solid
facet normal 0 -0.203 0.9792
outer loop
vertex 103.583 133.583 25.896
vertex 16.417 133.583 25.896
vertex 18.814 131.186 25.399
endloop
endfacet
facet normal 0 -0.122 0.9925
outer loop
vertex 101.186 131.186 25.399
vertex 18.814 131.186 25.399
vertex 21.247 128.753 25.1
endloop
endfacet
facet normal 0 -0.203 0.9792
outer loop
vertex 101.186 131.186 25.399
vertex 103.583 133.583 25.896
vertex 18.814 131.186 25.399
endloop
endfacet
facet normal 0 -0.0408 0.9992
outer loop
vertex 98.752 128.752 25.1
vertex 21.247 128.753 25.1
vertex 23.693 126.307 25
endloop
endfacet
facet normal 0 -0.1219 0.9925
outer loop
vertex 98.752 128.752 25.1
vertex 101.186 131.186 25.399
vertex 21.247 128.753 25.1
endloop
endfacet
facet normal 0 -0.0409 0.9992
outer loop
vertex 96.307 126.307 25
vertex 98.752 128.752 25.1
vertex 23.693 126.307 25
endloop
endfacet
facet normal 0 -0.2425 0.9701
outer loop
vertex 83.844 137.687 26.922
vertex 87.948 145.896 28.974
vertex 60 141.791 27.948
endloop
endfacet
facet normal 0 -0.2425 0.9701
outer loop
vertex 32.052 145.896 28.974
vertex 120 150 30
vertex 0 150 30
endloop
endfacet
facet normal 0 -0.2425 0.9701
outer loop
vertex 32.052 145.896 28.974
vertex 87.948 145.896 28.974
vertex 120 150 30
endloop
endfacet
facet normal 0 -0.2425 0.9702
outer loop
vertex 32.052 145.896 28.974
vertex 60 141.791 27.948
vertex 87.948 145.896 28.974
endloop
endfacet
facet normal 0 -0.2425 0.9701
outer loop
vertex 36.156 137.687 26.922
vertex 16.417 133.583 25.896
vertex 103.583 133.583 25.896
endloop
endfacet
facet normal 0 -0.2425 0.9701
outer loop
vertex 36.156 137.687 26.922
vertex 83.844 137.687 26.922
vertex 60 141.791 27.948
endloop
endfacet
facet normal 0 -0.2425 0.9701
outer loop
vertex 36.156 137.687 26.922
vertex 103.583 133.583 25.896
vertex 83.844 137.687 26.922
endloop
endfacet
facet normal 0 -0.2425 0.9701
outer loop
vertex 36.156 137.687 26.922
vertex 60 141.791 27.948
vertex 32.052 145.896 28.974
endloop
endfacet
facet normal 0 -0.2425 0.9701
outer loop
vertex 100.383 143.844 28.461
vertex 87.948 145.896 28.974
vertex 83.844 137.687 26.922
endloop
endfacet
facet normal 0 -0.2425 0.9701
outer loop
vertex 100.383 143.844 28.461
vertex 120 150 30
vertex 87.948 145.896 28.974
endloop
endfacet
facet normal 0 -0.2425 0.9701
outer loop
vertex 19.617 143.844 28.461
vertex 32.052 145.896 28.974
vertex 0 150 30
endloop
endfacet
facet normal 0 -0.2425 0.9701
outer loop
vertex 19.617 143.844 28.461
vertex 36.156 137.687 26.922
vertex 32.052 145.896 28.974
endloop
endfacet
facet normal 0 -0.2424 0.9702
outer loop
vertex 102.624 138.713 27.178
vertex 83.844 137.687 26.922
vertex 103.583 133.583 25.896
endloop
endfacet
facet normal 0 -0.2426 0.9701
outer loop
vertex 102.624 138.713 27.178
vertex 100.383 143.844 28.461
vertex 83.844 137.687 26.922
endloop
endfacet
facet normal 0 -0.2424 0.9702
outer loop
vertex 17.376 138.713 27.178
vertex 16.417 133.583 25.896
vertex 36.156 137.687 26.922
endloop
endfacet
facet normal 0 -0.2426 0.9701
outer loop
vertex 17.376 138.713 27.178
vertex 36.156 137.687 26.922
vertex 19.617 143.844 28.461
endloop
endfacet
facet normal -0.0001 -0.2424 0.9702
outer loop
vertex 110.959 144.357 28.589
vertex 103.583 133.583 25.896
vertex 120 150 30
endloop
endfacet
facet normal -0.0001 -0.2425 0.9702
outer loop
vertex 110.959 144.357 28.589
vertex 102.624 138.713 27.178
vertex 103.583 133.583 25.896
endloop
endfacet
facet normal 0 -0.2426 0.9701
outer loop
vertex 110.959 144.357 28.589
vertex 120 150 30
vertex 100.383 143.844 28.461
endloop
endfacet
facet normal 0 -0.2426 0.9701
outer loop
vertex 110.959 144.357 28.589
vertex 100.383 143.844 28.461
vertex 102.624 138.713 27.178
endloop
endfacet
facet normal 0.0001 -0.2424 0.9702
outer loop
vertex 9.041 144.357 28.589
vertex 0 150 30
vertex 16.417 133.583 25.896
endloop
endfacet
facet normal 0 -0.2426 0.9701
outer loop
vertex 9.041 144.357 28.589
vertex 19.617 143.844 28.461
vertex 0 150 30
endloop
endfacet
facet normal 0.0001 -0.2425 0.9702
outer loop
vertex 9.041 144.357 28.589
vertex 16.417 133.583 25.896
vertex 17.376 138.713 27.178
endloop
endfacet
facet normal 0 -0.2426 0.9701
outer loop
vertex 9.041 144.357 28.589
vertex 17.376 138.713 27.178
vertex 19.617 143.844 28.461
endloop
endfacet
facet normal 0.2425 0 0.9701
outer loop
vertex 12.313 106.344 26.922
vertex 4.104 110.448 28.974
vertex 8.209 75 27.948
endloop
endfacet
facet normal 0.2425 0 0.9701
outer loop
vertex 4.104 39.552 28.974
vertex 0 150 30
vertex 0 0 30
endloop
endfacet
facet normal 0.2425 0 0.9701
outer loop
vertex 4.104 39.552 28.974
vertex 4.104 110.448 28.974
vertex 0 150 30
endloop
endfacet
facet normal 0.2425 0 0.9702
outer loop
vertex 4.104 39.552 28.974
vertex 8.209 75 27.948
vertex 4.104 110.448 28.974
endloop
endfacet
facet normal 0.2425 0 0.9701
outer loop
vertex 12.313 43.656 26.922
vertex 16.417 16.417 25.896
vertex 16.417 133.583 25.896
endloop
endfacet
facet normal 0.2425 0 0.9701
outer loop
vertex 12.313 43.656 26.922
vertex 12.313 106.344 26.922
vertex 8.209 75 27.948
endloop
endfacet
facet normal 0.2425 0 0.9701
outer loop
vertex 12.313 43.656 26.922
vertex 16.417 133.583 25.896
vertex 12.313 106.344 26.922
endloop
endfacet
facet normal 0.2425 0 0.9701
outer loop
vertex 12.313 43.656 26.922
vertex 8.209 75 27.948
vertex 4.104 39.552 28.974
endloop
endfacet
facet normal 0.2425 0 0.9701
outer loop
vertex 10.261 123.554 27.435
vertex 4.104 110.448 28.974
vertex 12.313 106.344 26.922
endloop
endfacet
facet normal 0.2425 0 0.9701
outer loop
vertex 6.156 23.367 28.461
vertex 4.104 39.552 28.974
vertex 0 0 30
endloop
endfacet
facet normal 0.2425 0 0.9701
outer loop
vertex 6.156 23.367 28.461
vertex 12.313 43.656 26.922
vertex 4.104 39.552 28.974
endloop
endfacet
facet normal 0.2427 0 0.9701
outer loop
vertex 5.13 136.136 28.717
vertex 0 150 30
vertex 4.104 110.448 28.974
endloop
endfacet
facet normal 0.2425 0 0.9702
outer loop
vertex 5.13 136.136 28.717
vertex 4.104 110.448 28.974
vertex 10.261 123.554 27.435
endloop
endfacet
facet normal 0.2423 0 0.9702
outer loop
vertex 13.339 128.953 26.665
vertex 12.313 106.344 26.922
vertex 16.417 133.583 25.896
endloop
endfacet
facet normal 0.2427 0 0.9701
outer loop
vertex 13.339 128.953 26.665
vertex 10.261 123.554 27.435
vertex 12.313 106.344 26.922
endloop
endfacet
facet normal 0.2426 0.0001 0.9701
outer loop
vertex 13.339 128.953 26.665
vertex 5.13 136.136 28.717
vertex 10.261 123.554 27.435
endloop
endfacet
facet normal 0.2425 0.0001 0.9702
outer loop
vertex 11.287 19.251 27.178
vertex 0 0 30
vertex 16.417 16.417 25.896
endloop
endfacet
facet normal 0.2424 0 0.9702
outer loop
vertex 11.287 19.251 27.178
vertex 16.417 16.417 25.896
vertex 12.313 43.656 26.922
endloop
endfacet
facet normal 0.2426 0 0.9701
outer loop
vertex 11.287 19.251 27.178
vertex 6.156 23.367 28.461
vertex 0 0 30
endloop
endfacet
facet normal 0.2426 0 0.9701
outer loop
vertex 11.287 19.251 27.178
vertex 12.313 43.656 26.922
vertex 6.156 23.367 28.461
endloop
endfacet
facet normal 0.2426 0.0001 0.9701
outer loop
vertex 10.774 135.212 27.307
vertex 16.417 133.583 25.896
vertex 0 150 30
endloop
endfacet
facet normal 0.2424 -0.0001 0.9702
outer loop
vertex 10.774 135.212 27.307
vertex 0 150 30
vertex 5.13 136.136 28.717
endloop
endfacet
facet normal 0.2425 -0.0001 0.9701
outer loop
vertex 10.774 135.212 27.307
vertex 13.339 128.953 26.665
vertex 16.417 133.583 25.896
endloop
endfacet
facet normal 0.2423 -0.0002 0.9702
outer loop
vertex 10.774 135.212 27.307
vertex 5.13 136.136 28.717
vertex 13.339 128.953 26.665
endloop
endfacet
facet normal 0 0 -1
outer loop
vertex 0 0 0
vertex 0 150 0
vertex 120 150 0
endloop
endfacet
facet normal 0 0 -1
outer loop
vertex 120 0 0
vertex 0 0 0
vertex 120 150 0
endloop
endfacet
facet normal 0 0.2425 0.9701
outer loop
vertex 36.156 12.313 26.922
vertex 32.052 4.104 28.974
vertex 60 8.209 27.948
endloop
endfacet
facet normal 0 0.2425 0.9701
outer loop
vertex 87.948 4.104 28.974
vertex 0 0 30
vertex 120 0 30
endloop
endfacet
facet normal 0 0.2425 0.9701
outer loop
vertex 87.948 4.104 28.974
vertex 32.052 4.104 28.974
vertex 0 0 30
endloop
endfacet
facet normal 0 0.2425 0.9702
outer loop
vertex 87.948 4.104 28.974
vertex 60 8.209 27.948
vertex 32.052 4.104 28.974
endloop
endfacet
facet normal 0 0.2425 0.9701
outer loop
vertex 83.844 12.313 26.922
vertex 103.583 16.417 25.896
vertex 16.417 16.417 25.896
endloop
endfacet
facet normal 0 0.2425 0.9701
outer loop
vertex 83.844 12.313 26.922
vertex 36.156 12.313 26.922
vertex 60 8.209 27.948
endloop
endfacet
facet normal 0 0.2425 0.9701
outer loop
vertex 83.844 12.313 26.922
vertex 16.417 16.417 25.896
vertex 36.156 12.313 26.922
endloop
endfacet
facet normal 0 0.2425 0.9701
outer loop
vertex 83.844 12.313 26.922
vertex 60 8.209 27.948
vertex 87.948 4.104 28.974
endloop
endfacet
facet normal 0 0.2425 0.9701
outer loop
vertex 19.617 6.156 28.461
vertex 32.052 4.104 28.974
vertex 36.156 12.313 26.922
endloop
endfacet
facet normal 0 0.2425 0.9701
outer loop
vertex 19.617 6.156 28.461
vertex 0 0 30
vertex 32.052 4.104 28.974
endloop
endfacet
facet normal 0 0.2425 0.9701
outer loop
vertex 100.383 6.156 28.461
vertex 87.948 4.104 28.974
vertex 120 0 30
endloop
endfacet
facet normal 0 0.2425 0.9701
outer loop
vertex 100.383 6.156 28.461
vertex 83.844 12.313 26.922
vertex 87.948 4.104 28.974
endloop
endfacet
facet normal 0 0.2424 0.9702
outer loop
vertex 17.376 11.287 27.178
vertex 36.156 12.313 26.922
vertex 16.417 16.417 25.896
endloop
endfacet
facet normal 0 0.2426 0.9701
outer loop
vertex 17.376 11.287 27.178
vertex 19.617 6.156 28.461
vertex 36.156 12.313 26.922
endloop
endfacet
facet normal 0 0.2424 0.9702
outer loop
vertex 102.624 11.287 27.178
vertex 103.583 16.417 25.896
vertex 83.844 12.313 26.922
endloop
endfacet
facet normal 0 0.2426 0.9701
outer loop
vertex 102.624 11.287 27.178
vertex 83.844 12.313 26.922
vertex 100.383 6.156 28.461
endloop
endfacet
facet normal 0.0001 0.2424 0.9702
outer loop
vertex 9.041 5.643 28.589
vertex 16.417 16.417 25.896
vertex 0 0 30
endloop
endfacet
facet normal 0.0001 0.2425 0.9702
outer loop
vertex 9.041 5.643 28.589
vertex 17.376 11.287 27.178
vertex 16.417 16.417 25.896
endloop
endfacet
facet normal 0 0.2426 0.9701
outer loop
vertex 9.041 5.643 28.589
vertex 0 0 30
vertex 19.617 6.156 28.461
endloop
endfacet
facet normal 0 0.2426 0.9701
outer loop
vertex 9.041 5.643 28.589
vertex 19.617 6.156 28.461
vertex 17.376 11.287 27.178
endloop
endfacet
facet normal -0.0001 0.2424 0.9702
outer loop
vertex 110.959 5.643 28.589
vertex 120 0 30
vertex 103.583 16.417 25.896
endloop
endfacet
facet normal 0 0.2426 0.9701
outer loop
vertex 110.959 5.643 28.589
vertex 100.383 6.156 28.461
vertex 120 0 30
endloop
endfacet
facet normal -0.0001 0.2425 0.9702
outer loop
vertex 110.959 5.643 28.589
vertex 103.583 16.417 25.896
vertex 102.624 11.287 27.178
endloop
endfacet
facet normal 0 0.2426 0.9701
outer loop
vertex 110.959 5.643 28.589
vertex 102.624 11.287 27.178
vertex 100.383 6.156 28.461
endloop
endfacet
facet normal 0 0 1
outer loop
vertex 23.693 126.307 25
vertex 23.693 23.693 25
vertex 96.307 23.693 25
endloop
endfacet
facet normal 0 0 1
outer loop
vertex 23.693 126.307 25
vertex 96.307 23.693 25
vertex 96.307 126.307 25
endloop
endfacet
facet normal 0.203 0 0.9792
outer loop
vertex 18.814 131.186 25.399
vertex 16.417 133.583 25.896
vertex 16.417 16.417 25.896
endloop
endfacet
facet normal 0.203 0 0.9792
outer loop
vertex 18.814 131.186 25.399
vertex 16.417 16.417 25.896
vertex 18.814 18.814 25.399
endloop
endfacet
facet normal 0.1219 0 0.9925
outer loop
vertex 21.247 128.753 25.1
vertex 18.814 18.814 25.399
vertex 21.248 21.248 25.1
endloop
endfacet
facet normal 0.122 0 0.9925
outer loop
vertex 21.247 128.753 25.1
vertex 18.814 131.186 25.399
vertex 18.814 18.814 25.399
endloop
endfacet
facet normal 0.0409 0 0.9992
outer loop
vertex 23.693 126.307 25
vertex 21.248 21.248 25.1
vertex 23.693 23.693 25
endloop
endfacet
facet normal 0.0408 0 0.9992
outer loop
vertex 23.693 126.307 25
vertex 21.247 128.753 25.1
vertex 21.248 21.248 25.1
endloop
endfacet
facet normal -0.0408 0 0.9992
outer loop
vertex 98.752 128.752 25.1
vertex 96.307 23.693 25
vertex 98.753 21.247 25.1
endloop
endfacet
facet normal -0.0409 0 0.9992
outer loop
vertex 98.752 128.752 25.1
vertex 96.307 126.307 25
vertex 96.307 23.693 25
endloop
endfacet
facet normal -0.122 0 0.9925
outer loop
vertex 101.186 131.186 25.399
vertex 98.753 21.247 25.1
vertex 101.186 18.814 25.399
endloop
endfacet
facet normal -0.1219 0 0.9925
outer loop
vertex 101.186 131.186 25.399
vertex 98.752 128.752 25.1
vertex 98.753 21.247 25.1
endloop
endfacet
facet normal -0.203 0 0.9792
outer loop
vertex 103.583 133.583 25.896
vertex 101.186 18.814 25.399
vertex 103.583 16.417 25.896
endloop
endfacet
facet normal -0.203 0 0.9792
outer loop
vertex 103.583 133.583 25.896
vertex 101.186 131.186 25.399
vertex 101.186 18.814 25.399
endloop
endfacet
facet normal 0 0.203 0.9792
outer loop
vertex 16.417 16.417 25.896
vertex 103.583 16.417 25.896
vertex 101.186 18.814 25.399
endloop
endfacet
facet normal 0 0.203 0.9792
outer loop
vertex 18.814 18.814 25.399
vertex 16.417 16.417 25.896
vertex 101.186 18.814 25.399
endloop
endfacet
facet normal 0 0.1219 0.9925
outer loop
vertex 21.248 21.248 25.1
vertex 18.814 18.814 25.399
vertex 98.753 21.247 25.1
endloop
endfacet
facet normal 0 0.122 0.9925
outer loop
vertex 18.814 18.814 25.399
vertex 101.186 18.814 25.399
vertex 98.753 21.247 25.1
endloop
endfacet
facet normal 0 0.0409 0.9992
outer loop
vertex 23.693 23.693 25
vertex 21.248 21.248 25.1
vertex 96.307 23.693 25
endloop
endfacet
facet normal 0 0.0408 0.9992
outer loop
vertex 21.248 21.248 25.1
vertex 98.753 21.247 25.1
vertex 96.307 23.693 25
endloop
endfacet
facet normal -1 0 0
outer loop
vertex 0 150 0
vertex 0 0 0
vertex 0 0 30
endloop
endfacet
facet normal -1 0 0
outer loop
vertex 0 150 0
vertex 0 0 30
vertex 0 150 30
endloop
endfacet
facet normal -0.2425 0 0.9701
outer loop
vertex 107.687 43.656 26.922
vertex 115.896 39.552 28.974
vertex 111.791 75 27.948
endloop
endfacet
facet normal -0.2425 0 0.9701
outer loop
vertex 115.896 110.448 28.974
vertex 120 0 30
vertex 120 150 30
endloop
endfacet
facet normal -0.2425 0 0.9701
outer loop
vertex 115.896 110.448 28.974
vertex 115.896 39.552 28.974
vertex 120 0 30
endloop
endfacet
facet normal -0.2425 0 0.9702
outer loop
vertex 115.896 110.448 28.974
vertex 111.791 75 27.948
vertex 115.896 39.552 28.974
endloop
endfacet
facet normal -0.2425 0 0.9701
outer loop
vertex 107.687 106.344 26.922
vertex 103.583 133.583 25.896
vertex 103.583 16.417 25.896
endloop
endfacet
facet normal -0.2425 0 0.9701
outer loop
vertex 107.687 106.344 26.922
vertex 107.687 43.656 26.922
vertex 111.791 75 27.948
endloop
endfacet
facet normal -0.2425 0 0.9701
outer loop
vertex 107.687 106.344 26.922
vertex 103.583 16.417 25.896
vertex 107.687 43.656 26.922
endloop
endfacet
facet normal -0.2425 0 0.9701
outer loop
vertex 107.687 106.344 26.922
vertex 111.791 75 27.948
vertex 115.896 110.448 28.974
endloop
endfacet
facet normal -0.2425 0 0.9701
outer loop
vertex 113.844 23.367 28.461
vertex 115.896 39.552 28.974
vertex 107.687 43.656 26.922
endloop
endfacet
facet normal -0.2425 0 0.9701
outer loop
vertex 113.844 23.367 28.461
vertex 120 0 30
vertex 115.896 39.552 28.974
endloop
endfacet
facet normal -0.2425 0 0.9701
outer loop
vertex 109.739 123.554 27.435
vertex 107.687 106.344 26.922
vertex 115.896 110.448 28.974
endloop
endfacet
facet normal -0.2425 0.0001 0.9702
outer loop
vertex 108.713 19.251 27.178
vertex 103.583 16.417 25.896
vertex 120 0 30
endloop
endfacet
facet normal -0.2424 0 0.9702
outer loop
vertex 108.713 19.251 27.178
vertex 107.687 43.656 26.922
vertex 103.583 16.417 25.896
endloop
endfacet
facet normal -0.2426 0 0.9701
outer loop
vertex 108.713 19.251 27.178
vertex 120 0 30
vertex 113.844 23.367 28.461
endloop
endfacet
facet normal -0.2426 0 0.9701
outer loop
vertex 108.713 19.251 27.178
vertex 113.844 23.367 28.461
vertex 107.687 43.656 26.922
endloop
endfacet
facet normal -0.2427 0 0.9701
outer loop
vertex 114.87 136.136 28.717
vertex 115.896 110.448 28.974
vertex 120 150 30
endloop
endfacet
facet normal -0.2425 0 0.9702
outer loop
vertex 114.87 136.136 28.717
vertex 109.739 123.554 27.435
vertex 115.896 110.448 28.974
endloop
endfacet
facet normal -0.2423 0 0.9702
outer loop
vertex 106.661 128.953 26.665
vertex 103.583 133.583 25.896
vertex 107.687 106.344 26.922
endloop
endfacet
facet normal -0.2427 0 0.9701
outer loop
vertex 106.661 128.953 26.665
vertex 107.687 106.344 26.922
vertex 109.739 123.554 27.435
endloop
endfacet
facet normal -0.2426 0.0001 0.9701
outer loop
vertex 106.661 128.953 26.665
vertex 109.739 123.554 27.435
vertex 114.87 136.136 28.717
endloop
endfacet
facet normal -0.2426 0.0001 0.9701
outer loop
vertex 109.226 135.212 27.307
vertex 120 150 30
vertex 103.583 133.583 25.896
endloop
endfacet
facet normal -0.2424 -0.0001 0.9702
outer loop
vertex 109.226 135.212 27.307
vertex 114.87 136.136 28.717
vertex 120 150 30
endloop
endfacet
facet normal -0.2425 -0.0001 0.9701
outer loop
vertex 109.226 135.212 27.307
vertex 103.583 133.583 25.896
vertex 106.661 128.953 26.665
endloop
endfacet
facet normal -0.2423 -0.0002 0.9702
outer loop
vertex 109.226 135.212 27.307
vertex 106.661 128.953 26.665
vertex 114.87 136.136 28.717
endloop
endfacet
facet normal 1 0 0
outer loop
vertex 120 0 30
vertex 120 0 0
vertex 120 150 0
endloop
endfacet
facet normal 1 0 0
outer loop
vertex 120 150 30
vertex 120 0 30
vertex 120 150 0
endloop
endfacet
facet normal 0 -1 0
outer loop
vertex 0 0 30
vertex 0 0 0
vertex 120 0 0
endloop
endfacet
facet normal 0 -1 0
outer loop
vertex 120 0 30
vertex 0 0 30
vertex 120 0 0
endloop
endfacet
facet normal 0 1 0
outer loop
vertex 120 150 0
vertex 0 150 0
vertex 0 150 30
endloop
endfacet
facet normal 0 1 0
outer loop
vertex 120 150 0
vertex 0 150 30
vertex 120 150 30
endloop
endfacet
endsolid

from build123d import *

# Parameters (mm, degrees)
F0_W      = 120
F0_H      = 150
F1_DEPTH  = 30
F1_FACE_W = 120
F1_FACE_H = 150
F3_W      = 80
F3_H      = 110
F5_R      = 30


with BuildPart() as f1:
    # F0 (on Top) → F1 (new body)
    with BuildSketch(Plane.XY):
        with Locations((60, 75)):
            Rectangle(F0_W, F0_H)
    extrude(amount=F1_DEPTH)

    # F1_face (on face) → F4 section 0
    with BuildSketch(Plane(origin=(60, 75, 30), x_dir=(1, 0, 0), z_dir=(0, 0, 1))):
        Rectangle(F1_FACE_W, F1_FACE_H)
    # F3 (on offset) → F4 section 1
    with BuildSketch(Plane.XY.offset(25)):
        with Locations((60, 75)):
            Rectangle(F3_W, F3_H)
    loft(mode=Mode.SUBTRACT)

    # F5
    f5_edges = [f1.edges().sort_by_distance(p)[0] for p in [
        (20, 75, 25),
        (60, 20, 25),
        (100, 75, 25),
        (60, 130, 25),
    ]]
    fillet(f5_edges, radius=F5_R)


solid = f1.part
